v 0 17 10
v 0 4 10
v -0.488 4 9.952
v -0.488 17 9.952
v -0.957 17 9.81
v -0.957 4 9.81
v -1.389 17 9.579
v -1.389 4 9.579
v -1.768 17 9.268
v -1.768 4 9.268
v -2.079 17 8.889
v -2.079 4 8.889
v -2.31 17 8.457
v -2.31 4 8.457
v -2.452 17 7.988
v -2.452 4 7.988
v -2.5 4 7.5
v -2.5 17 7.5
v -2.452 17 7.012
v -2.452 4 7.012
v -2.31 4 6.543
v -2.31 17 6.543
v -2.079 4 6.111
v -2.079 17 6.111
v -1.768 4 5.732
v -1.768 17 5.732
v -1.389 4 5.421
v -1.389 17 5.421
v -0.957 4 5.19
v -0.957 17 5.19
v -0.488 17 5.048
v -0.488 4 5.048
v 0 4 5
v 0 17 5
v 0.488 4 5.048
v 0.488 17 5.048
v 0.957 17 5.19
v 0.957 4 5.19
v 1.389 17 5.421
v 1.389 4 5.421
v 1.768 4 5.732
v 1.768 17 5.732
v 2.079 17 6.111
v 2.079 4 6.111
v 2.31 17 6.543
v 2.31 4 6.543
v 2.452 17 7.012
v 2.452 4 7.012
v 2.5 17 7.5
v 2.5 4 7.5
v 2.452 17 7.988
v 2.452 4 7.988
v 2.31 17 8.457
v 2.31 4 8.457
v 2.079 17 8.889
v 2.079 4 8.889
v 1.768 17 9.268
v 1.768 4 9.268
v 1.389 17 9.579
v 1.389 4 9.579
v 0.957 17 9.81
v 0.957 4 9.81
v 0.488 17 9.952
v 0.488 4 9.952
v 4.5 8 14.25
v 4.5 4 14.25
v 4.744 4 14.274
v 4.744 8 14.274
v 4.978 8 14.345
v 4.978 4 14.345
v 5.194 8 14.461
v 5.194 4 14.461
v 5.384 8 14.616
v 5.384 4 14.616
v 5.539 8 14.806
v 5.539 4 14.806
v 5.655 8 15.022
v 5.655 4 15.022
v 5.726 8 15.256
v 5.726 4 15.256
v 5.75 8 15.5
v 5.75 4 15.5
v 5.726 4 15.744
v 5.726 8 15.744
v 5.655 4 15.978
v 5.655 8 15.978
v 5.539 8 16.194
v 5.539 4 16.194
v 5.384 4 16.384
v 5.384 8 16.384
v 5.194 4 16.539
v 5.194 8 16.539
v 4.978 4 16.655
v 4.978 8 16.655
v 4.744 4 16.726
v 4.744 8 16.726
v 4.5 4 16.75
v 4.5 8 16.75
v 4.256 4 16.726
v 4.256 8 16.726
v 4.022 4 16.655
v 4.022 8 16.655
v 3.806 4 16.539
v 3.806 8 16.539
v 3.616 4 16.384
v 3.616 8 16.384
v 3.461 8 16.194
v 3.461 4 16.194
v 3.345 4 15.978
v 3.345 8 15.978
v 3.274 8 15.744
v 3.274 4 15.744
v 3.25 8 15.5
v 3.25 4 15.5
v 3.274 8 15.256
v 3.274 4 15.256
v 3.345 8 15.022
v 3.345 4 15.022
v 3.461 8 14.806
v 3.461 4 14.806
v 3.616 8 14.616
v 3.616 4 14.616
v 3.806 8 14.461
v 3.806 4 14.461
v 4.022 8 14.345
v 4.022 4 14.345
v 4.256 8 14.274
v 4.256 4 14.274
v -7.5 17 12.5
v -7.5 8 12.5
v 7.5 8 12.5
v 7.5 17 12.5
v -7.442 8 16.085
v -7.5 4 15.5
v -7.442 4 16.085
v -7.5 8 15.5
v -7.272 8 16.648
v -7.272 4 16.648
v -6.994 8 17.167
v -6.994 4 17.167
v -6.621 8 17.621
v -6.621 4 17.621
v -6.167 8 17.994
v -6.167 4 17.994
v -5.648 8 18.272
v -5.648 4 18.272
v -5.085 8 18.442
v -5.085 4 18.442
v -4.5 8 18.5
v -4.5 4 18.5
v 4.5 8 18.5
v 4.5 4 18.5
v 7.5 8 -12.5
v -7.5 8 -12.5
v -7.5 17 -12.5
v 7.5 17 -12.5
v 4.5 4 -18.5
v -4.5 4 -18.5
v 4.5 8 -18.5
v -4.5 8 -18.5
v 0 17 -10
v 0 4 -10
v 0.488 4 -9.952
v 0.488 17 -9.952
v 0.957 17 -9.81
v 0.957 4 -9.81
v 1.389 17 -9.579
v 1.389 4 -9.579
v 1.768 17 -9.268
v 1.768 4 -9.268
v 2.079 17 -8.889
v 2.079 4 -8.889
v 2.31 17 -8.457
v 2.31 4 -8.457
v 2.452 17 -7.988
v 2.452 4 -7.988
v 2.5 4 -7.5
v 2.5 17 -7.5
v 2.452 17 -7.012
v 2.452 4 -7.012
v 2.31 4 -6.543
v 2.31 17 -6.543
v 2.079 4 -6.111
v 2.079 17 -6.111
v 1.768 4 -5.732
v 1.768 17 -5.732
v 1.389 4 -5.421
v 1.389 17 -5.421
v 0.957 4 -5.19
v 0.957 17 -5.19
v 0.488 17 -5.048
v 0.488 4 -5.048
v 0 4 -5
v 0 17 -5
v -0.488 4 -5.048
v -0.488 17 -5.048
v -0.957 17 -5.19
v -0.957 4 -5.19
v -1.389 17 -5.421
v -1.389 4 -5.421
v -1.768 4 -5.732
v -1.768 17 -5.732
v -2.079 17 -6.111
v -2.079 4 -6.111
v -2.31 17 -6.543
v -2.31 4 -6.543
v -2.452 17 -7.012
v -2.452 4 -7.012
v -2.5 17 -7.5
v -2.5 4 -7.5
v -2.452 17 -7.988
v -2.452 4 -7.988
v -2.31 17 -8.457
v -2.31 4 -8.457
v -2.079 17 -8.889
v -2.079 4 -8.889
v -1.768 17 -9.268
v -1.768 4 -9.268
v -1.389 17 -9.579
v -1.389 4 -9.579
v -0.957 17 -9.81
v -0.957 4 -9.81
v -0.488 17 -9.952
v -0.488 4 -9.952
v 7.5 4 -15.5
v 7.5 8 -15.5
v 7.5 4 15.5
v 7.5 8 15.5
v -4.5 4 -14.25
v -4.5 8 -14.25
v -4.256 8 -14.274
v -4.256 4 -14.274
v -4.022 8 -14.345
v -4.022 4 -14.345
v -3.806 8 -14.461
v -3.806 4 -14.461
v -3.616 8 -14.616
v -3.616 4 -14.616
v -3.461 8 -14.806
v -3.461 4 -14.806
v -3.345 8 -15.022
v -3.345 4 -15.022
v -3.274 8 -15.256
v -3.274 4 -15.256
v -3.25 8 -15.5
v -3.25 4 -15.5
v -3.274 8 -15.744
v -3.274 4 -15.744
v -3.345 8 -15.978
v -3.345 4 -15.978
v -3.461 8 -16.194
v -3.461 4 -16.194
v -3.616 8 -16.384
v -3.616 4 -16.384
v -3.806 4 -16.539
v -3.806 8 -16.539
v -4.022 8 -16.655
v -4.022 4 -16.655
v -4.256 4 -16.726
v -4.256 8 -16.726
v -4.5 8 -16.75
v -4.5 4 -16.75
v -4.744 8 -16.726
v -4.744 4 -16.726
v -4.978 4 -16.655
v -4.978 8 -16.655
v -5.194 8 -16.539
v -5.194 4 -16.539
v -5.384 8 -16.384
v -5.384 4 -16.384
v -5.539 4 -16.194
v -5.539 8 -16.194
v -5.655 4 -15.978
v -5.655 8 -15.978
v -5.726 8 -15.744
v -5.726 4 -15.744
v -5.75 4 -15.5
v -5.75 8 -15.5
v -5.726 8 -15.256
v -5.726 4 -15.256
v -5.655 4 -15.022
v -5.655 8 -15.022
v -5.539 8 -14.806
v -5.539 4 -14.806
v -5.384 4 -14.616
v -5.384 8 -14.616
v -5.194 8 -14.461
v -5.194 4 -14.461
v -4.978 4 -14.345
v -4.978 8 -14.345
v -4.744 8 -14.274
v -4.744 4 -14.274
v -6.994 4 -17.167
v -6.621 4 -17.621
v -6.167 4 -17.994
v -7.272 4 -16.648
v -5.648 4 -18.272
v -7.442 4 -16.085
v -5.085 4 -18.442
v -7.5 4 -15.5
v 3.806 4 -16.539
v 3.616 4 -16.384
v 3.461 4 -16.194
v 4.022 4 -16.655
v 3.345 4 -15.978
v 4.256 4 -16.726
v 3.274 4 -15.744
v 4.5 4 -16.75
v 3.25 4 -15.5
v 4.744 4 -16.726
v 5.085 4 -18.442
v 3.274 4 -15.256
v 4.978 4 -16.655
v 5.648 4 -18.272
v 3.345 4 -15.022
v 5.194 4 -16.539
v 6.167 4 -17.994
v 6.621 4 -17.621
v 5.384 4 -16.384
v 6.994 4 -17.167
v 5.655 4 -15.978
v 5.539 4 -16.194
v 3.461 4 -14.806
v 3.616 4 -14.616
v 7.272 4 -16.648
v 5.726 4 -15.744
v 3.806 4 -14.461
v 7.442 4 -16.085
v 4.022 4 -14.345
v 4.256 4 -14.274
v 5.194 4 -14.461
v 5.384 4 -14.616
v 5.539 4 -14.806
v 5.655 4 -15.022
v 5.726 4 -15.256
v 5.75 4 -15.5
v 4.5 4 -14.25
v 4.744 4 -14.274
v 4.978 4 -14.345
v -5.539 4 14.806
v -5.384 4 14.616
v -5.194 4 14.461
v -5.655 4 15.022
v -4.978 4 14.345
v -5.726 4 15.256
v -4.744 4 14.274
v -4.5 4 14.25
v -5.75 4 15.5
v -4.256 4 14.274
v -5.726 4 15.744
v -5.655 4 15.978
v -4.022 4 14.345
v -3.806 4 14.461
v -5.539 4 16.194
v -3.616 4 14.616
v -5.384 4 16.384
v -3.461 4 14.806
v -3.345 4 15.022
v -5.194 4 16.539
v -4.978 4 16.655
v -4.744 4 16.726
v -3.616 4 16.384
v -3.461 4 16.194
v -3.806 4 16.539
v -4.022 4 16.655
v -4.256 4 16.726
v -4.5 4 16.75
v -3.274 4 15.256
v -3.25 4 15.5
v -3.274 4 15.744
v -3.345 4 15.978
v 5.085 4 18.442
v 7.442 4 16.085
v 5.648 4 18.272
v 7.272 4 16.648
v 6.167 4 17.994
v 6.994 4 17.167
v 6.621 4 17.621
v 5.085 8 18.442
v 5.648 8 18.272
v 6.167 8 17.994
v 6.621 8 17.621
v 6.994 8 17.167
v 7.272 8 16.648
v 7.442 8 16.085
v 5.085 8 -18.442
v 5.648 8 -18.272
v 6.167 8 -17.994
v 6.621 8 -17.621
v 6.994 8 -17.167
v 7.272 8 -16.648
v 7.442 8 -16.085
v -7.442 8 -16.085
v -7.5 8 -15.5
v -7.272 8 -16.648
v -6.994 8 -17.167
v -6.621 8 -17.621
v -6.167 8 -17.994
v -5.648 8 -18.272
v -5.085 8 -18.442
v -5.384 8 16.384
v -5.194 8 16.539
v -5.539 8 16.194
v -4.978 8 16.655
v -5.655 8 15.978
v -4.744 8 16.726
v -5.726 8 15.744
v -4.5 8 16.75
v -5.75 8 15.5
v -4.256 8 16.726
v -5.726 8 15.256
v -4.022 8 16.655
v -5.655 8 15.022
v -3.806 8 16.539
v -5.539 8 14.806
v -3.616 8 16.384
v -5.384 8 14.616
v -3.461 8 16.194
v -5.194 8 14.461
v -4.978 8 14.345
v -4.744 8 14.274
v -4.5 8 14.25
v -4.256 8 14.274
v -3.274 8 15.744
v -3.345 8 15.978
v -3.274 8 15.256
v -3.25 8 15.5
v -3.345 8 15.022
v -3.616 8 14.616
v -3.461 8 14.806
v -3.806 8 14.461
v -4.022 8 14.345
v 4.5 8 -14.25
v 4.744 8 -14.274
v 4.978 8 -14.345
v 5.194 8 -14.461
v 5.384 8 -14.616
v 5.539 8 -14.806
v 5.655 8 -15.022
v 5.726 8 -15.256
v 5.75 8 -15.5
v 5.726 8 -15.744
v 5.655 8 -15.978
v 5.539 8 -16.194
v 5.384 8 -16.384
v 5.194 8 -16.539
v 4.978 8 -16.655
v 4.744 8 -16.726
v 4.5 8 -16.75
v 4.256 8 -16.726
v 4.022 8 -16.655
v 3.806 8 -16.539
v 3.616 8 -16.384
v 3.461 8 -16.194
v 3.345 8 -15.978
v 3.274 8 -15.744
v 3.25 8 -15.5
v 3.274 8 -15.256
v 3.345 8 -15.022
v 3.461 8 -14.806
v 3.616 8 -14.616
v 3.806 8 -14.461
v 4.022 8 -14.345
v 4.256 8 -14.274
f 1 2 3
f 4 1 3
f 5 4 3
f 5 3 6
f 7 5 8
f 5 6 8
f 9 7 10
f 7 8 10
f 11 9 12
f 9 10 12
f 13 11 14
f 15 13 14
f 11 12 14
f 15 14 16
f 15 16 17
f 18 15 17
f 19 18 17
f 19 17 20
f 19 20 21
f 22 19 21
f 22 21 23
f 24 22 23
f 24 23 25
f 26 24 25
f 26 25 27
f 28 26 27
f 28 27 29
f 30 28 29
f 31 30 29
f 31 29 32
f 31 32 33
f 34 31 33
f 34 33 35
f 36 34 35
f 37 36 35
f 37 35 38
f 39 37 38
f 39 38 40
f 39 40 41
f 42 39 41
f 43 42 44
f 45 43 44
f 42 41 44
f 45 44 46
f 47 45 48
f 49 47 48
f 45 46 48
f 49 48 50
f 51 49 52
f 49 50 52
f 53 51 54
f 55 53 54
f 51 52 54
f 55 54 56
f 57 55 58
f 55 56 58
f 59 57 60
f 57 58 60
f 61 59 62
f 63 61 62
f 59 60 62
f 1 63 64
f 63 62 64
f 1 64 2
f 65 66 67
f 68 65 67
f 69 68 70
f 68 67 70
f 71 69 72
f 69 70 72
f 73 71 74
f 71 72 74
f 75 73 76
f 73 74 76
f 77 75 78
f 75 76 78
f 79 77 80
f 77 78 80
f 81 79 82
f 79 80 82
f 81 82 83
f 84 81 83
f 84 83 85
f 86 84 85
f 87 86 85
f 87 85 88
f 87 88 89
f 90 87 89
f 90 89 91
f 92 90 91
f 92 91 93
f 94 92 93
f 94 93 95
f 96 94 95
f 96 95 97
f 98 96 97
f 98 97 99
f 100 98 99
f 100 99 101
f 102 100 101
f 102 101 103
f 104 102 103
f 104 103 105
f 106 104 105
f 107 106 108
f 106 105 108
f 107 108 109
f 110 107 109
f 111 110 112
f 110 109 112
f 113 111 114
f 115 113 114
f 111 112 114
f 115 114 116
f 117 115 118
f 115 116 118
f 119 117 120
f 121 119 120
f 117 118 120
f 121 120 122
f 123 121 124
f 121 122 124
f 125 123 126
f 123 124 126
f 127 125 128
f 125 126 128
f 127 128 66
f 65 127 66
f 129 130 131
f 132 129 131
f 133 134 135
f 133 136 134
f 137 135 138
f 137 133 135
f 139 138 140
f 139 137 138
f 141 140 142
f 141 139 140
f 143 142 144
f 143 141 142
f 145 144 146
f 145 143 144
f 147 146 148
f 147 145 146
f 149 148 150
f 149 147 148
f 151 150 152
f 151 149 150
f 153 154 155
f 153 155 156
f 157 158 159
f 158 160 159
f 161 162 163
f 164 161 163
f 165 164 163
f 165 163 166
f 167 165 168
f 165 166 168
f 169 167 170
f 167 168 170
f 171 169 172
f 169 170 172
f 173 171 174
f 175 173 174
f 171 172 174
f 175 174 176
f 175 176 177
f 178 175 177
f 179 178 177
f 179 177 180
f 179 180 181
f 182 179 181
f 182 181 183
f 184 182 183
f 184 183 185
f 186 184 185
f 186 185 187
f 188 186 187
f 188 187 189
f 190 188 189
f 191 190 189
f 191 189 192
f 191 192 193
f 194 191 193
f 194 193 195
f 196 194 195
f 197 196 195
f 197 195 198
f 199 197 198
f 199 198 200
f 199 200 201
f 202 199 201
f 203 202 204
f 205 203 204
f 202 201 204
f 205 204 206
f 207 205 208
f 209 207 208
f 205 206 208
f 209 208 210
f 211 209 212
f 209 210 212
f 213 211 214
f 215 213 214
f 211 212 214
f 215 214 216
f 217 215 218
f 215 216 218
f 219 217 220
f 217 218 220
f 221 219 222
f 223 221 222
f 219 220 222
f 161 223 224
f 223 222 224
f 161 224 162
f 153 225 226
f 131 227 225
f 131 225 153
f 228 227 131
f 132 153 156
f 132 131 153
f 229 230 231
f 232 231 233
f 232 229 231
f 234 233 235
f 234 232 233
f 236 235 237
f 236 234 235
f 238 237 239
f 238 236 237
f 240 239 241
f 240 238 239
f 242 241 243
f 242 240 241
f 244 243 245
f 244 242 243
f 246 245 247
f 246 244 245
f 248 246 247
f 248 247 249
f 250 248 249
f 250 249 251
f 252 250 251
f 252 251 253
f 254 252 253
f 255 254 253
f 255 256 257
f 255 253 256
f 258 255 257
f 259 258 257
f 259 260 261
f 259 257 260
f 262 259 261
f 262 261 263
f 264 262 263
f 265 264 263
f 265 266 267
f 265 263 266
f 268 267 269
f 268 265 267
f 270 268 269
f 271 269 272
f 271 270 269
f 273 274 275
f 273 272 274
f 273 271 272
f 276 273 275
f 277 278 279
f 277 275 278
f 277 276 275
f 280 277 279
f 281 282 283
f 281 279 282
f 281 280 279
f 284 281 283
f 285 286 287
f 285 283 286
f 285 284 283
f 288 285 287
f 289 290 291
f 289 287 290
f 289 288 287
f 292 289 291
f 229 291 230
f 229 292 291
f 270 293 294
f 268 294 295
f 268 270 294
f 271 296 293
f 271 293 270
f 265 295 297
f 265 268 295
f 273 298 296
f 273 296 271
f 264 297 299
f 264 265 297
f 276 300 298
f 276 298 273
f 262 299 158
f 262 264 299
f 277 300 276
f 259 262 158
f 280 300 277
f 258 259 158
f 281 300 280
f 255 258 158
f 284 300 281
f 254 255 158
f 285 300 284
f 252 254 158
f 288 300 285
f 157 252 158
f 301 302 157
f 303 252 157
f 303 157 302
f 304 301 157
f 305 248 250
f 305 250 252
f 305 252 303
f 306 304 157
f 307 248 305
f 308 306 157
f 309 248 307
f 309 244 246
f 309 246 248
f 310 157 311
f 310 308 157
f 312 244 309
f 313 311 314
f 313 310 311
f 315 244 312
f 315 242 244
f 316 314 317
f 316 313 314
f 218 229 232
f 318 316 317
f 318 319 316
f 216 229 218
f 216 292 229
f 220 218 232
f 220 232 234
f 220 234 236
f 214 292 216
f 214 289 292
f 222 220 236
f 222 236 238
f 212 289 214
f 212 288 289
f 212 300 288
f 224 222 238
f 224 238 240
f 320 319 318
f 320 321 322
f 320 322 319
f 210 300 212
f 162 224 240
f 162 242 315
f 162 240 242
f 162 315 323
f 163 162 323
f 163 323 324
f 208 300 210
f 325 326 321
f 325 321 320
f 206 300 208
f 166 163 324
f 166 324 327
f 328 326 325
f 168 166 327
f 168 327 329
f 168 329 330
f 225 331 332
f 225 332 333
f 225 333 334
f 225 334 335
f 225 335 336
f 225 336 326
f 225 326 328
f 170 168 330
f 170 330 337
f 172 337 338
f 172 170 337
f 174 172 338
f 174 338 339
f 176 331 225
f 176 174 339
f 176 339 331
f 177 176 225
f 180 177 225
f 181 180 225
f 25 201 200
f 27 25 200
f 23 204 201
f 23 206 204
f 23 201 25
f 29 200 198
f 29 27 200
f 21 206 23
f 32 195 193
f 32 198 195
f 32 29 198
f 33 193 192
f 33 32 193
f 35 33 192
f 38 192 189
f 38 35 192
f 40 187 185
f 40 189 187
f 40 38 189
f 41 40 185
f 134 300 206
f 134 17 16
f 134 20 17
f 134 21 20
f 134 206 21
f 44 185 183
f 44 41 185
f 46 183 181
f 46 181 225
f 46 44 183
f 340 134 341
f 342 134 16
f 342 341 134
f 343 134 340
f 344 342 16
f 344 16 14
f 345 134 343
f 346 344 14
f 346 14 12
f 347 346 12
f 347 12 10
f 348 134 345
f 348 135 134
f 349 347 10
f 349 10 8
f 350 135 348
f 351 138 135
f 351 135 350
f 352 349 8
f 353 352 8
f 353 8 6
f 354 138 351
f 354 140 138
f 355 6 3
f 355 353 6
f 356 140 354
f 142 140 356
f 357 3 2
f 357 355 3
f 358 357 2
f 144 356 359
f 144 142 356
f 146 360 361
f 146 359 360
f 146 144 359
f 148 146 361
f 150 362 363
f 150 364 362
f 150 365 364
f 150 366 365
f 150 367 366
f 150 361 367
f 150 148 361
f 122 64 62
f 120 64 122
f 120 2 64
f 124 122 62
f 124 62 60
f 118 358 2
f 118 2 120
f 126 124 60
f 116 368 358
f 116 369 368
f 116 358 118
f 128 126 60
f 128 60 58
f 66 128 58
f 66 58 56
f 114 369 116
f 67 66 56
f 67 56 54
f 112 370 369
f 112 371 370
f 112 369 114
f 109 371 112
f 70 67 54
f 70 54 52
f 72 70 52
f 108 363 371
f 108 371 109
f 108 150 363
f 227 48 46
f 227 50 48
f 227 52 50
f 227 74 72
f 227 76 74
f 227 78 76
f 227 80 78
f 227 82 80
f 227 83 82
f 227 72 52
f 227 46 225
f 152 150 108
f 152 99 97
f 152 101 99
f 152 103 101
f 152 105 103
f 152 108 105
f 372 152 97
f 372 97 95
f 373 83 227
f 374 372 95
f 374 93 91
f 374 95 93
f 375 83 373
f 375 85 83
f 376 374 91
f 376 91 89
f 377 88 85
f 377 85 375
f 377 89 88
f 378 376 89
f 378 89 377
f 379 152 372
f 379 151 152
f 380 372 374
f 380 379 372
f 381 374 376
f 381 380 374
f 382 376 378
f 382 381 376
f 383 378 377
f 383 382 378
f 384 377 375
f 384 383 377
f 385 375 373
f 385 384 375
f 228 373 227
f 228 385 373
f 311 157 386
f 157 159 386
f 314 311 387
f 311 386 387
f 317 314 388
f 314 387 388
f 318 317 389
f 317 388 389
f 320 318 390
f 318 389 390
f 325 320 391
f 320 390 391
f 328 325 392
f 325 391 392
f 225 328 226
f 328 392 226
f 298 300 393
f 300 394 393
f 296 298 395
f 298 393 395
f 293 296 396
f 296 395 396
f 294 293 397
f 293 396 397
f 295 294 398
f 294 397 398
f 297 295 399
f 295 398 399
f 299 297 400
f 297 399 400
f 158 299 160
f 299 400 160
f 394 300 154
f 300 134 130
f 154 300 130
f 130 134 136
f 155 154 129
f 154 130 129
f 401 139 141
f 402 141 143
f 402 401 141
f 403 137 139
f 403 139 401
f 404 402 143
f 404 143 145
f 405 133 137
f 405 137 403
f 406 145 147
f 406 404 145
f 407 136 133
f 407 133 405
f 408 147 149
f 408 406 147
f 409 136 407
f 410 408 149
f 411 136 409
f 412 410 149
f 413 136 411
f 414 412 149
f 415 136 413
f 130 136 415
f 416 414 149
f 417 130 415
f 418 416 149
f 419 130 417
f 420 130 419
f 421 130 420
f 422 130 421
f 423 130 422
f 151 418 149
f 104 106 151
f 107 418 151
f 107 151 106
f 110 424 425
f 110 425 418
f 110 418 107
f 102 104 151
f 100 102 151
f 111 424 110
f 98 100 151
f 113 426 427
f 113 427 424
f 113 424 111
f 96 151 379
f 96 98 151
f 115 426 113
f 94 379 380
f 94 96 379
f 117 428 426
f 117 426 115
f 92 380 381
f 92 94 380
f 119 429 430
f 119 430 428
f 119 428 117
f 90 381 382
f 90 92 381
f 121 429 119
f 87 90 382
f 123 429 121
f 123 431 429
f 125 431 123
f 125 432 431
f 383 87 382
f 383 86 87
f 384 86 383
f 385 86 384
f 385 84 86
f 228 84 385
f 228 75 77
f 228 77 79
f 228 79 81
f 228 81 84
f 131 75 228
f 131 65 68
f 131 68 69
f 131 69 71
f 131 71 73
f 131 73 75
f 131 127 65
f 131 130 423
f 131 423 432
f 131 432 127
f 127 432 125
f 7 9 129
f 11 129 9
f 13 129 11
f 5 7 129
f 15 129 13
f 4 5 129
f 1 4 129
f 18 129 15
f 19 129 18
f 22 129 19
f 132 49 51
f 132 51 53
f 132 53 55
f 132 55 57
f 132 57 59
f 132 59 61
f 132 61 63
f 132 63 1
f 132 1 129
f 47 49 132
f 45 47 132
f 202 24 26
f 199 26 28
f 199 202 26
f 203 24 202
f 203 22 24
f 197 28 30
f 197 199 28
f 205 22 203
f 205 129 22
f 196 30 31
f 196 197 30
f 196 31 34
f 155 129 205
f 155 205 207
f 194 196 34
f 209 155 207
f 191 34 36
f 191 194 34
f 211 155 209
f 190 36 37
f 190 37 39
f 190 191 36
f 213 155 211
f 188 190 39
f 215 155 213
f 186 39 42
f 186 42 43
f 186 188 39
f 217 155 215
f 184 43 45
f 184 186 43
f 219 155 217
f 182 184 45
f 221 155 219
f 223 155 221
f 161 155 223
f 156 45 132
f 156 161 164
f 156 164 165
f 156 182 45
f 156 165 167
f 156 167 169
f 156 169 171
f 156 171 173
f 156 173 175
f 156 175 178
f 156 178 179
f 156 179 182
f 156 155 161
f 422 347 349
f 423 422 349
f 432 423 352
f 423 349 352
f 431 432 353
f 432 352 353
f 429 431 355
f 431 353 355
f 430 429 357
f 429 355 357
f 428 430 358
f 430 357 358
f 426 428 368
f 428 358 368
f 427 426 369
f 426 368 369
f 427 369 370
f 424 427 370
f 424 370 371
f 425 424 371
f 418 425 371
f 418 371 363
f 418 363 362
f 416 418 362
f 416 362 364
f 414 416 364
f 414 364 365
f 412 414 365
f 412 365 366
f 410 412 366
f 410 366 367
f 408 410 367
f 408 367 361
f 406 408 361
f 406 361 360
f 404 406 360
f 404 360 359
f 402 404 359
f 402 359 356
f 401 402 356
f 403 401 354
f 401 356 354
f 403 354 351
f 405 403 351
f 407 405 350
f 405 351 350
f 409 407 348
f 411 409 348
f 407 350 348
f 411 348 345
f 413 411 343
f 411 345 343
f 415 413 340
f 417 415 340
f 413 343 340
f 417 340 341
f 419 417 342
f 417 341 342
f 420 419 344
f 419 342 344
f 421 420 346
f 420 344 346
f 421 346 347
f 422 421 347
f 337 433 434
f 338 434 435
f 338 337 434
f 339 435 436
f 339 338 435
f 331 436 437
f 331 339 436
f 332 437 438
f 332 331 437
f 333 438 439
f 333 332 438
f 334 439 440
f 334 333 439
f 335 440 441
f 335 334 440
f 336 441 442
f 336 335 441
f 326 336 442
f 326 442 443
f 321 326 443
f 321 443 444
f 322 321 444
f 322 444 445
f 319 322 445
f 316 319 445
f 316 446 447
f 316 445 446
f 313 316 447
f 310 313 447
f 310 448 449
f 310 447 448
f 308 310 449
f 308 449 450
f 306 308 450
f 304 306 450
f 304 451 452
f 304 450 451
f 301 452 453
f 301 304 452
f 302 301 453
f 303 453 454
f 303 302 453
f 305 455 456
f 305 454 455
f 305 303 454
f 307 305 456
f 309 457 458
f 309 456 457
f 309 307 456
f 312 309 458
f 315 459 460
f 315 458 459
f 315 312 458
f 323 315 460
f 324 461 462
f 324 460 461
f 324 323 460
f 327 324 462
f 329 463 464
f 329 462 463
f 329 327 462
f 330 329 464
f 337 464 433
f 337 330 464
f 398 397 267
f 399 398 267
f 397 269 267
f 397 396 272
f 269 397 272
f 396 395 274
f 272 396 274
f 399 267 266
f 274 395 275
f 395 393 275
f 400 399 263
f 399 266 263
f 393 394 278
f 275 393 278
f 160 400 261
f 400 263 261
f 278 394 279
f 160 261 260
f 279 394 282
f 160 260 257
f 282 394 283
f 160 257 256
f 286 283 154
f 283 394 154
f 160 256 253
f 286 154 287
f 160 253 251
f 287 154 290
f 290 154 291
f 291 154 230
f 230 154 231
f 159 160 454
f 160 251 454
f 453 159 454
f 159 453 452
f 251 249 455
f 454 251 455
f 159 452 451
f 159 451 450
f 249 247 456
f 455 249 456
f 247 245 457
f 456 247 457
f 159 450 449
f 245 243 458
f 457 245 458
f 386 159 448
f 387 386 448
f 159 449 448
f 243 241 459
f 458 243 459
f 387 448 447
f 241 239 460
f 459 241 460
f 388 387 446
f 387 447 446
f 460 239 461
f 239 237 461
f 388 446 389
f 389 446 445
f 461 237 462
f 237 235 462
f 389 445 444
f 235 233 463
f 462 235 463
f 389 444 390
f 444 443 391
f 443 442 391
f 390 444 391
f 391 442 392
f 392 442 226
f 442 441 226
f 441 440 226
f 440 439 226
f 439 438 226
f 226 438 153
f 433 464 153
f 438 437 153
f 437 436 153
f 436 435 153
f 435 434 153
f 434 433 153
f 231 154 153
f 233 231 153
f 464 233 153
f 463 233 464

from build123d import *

# Parameters (mm, degrees)
SKETCH_1_W          = 65
SKETCH_1_H          = 25
EXTRUDE_1_DEPTH     = 4
SKETCH_2_W          = 15
SKETCH_2_H          = 25
EXTRUDE_2_DEPTH     = 13
SKETCH_3_R          = 2.5
SKETCH_3_R_2        = 4
CUT_EXTRUDE_1_DEPTH = 39.74919354
SKETCH_5_W          = 15
SKETCH_5_H          = 4
EXTRUDE_3_DEPTH     = 6
SKETCH_6_R          = 1.25
CUT_EXTRUDE_3_DEPTH = 40.59166579
FILLET_2_R          = 3
CUT_EXTRUDE_4_DEPTH = 49.023431781


with BuildPart() as part:
    # 草图1 → 凸台-拉伸1 (new body)
    with BuildSketch(Plane(origin=(0, 0, 0), x_dir=(1, 0, 0), z_dir=(0, 1, 0))):
        Rectangle(SKETCH_1_W, SKETCH_1_H)
    extrude(amount=EXTRUDE_1_DEPTH)

    # 草图2 → 凸台-拉伸2 (add)
    with BuildSketch(Plane(origin=(0, 4, 0), x_dir=(1, 0, 0), z_dir=(0, 1, 0))):
        Rectangle(SKETCH_2_W, SKETCH_2_H)
    extrude(amount=EXTRUDE_2_DEPTH)

    # 草图3 → 切除-拉伸1 (cut, through all)
    with BuildSketch(Plane.XZ):
        with Locations(Location((0, -7.5, 0), (0, 0, 270))):
            Circle(SKETCH_3_R)
        with Locations(Location((0, 7.5, 0), (0, 0, 90))):
            Circle(SKETCH_3_R)
        with Locations(Location((-22, 0, 0), (0, 0, 270))):
            Circle(SKETCH_3_R_2)
        with Locations(Location((22, 0, 0), (0, 0, 90))):
            Circle(SKETCH_3_R_2)
    extrude(amount=-CUT_EXTRUDE_1_DEPTH, mode=Mode.SUBTRACT)

    # 草图5 → 凸台-拉伸3 (add)
    with BuildSketch(Plane.XY.offset(12.5)):
        with Locations((0, 6)):
            Rectangle(SKETCH_5_W, SKETCH_5_H)
    extrude_3 = extrude(amount=EXTRUDE_3_DEPTH)

    # 草图6 → 切除-拉伸3 (cut, through all)
    with BuildSketch(Plane.XZ.offset(-4)):
        with Locations(Location((-4.5, 15.5, 0), (0, 0, 270))):
            Circle(SKETCH_6_R)
        with Locations(Location((4.5, 15.5, 0), (0, 0, 270))):
            Circle(SKETCH_6_R)
    cut_extrude_3 = extrude(amount=-CUT_EXTRUDE_3_DEPTH, mode=Mode.SUBTRACT)

    # 镜向2: 凸台-拉伸3, 切除-拉伸3 across plane
    add(extrude_3.mirror(Plane.XY))
    add(cut_extrude_3.mirror(Plane.XY), mode=Mode.SUBTRACT)

    # 圆角2
    fillet_2_edges = [part.edges().sort_by_distance(p)[0] for p in [
        (-7.5, 6, 18.5),
        (7.5, 6, 18.5),
        (-7.5, 6, -18.5),
        (7.5, 6, -18.5),
    ]]
    fillet(fillet_2_edges, radius=FILLET_2_R)

    # 草图7 → 切除-拉伸4 (cut, through all)
    with BuildSketch(Plane(origin=(0, 0, -12.5), x_dir=(-1, 0, 0), z_dir=(0, 0, -1))):
        Polygon((32.5, 4), (7.5, 4), (-7.5, 4), (-32.5, 4), (-32.5, 0), (32.5, 0), align=None)
    extrude(amount=-CUT_EXTRUDE_4_DEPTH, mode=Mode.SUBTRACT)


solid = part.part
